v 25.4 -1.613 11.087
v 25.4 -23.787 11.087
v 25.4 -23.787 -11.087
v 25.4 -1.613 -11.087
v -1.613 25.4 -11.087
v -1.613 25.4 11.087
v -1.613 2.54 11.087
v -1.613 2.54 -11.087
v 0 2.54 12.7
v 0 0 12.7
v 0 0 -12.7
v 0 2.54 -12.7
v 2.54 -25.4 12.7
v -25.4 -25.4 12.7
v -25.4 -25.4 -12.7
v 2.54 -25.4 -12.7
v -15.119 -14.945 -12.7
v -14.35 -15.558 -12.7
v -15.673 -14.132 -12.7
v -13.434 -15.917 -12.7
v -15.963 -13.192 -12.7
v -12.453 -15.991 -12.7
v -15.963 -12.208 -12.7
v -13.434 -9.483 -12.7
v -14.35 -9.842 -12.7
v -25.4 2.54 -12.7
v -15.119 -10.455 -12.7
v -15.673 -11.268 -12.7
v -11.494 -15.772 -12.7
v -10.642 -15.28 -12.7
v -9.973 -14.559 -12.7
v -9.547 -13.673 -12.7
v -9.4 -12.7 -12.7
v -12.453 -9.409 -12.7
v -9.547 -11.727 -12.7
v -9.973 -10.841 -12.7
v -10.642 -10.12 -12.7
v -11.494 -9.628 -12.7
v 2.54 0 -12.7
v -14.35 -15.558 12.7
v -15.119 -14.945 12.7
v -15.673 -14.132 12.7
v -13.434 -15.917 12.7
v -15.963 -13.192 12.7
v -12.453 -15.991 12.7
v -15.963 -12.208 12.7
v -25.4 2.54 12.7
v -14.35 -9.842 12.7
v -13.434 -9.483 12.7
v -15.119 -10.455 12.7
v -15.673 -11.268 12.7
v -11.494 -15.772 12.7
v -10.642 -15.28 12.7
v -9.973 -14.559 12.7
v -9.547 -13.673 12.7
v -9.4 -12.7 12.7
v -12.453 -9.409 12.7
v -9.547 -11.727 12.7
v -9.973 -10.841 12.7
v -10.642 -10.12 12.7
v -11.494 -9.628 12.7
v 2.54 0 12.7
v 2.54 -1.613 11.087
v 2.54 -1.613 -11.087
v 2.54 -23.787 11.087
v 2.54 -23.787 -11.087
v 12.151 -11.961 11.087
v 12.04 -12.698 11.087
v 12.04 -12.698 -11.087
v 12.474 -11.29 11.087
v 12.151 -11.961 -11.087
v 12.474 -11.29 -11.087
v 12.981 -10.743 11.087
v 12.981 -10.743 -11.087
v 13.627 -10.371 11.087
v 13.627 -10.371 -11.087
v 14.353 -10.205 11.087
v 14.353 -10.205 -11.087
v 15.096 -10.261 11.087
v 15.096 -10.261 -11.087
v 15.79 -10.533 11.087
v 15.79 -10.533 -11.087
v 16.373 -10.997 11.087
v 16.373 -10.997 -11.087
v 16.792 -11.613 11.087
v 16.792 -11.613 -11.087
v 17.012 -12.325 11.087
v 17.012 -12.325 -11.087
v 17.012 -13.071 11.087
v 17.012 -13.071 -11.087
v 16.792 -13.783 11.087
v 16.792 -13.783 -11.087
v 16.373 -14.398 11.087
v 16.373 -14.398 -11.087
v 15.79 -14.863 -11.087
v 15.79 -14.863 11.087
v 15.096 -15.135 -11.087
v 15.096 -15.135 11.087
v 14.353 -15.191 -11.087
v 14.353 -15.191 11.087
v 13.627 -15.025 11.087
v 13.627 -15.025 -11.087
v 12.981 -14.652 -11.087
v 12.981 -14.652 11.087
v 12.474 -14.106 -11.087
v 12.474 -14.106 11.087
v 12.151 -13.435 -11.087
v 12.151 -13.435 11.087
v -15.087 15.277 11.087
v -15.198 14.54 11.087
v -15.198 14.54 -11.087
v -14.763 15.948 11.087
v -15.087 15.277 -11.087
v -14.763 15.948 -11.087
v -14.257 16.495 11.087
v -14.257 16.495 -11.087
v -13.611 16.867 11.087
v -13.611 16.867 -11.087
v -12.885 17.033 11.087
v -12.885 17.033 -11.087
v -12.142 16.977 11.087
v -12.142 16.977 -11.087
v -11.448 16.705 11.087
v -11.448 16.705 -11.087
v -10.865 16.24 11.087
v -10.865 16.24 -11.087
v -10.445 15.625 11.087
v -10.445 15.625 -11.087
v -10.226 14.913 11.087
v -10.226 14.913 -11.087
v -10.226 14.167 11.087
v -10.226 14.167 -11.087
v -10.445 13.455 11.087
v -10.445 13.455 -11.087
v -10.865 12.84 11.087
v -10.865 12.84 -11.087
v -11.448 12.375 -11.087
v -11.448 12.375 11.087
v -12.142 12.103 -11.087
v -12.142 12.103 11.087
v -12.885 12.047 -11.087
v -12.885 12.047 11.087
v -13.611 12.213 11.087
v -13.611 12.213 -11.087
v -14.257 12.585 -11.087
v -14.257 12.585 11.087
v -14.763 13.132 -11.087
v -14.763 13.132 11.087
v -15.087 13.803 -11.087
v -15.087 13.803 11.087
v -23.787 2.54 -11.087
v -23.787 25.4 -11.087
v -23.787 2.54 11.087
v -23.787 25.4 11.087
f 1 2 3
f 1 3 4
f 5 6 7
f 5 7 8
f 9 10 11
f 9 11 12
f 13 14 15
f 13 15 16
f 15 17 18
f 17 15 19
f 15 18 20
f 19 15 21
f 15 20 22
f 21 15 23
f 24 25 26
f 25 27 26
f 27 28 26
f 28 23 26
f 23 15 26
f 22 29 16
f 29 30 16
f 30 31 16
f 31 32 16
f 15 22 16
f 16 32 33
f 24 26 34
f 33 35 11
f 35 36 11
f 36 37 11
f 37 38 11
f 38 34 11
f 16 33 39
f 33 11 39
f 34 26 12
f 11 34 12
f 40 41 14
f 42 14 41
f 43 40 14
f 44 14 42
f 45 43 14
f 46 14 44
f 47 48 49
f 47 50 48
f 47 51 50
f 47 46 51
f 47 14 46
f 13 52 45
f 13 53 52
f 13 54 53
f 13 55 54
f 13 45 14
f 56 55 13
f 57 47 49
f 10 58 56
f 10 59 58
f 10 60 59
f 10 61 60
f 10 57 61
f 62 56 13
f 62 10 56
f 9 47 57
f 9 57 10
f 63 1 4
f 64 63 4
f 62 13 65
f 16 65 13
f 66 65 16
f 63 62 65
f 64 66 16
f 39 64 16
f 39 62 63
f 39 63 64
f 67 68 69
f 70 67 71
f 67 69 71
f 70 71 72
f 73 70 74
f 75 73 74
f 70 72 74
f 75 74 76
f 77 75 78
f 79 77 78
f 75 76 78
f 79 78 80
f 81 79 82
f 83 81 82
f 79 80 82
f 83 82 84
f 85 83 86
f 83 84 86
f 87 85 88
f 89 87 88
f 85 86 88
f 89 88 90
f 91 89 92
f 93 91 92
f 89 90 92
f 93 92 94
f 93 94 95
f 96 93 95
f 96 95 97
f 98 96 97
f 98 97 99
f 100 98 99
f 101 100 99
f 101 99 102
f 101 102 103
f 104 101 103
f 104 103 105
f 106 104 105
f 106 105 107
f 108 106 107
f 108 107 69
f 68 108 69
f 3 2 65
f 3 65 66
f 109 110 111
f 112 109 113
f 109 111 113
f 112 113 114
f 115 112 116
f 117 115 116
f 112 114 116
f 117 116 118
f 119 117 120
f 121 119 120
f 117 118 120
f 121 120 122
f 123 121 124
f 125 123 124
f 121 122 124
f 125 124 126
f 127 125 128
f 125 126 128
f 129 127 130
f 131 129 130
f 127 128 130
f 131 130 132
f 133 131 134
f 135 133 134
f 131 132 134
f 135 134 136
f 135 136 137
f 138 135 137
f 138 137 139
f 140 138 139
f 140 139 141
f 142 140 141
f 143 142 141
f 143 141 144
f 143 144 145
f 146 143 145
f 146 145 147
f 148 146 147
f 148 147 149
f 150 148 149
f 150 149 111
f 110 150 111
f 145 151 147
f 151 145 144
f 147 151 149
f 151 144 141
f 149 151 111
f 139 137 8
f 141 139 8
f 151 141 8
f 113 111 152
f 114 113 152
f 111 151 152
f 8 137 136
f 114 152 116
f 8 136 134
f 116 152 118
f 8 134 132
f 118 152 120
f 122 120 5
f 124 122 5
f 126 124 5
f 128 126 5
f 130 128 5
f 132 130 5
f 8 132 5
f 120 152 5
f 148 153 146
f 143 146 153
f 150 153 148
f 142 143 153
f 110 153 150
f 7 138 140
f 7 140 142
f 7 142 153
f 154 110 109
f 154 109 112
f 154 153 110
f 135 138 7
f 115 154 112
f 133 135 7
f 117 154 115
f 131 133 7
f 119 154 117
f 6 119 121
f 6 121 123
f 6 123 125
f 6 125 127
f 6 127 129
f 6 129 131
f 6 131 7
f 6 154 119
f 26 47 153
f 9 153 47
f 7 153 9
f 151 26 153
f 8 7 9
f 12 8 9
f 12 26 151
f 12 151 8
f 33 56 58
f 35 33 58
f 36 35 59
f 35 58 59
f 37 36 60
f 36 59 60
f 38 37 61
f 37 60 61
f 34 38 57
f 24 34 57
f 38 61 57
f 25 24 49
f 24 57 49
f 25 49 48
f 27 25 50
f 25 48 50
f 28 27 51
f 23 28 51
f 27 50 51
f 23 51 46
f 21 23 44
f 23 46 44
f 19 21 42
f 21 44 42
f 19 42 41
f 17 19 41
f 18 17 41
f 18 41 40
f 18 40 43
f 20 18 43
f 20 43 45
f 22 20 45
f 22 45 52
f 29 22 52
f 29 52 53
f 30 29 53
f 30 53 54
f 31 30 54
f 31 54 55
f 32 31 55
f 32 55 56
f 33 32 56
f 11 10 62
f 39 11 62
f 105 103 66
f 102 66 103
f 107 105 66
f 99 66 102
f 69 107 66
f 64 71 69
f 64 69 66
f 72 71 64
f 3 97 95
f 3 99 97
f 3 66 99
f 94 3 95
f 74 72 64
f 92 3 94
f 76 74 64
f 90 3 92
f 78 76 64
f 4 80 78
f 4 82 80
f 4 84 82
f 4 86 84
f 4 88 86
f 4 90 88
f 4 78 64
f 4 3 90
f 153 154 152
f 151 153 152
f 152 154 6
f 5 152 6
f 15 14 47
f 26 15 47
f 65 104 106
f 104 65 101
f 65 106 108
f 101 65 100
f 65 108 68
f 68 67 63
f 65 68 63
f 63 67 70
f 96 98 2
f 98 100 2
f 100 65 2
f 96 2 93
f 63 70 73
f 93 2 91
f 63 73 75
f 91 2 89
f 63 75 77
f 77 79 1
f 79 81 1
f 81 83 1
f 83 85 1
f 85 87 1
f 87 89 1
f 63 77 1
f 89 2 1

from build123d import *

# Parameters (mm, degrees)
SKETCH1_W                   = 50.8
SKETCH1_H                   = 50.8
BOSS_EXTRUDE1_DEPTH         = 12.7
SKETCH2_W                   = 25.4
SKETCH2_H                   = 25.4
CUT_EXTRUDE1_DEPTH          = 26.4
SKETCH3_W                   = 25.4
SKETCH3_H                   = 25.4
SKETCH3_W_2                 = 22.1742
SKETCH3_H_2                 = 22.1742
CUT_EXTRUDE2_DEPTH          = 22.86
SKETCH5_W                   = 25.4
SKETCH5_H                   = 25.4
SKETCH5_W_2                 = 22.1742
SKETCH5_H_2                 = 22.1742
CUT_EXTRUDE4_DEPTH          = 22.86
SKETCH7_R                   = 3.3
CUT_EXTRUDE6_DEPTH          = 26.4
TAP_DRILL_FOR_M6X1_0_TAP1_D = 5


with BuildPart() as part:
    # Sketch1 → Boss-Extrude1 (new body, symmetric)
    with BuildSketch(Plane.XY):
        Rectangle(SKETCH1_W, SKETCH1_H)
    extrude(amount=BOSS_EXTRUDE1_DEPTH, both=True)

    # Sketch2 → Cut-Extrude1 (cut, through all)
    with BuildSketch(Plane.XY.offset(12.7)):
        with Locations((12.7, 12.7)):
            Rectangle(SKETCH2_W, SKETCH2_H)
    extrude(amount=-CUT_EXTRUDE1_DEPTH, mode=Mode.SUBTRACT)

    # Sketch3 → Cut-Extrude2 (cut)
    with BuildSketch(Plane(origin=(25.4, 0, 0), x_dir=(0, 0, -1), z_dir=(1, 0, 0))):
        with Locations((0, -12.7)):
            Rectangle(SKETCH3_W, SKETCH3_H)
        with Locations((0, -12.7)):
            Rectangle(SKETCH3_W_2, SKETCH3_H_2, mode=Mode.SUBTRACT)
    extrude(amount=-CUT_EXTRUDE2_DEPTH, mode=Mode.SUBTRACT)

    # Sketch5 → Cut-Extrude4 (cut)
    with BuildSketch(Plane(origin=(0, 25.4, 0), x_dir=(1, 0, 0), z_dir=(0, 1, 0))):
        with Locations((-12.7, 0)):
            Rectangle(SKETCH5_W, SKETCH5_H)
        with Locations((-12.7, 0)):
            Rectangle(SKETCH5_W_2, SKETCH5_H_2, mode=Mode.SUBTRACT)
    extrude(amount=-CUT_EXTRUDE4_DEPTH, mode=Mode.SUBTRACT)

    # Sketch7 → Cut-Extrude6 (cut, through all)
    with BuildSketch(Plane.XY.offset(12.7)):
        with Locations((-12.7, -12.7)):
            Circle(SKETCH7_R)
    extrude(amount=-CUT_EXTRUDE6_DEPTH, mode=Mode.SUBTRACT)

    # Tap Drill for M6x1.0 Tap1 (through all)
    with Locations(Plane.XY.offset(11.0871)):
        with Locations((14.54, -12.6979), (-12.6979, 14.54)):
            Hole(TAP_DRILL_FOR_M6X1_0_TAP1_D / 2)


solid = part.part
